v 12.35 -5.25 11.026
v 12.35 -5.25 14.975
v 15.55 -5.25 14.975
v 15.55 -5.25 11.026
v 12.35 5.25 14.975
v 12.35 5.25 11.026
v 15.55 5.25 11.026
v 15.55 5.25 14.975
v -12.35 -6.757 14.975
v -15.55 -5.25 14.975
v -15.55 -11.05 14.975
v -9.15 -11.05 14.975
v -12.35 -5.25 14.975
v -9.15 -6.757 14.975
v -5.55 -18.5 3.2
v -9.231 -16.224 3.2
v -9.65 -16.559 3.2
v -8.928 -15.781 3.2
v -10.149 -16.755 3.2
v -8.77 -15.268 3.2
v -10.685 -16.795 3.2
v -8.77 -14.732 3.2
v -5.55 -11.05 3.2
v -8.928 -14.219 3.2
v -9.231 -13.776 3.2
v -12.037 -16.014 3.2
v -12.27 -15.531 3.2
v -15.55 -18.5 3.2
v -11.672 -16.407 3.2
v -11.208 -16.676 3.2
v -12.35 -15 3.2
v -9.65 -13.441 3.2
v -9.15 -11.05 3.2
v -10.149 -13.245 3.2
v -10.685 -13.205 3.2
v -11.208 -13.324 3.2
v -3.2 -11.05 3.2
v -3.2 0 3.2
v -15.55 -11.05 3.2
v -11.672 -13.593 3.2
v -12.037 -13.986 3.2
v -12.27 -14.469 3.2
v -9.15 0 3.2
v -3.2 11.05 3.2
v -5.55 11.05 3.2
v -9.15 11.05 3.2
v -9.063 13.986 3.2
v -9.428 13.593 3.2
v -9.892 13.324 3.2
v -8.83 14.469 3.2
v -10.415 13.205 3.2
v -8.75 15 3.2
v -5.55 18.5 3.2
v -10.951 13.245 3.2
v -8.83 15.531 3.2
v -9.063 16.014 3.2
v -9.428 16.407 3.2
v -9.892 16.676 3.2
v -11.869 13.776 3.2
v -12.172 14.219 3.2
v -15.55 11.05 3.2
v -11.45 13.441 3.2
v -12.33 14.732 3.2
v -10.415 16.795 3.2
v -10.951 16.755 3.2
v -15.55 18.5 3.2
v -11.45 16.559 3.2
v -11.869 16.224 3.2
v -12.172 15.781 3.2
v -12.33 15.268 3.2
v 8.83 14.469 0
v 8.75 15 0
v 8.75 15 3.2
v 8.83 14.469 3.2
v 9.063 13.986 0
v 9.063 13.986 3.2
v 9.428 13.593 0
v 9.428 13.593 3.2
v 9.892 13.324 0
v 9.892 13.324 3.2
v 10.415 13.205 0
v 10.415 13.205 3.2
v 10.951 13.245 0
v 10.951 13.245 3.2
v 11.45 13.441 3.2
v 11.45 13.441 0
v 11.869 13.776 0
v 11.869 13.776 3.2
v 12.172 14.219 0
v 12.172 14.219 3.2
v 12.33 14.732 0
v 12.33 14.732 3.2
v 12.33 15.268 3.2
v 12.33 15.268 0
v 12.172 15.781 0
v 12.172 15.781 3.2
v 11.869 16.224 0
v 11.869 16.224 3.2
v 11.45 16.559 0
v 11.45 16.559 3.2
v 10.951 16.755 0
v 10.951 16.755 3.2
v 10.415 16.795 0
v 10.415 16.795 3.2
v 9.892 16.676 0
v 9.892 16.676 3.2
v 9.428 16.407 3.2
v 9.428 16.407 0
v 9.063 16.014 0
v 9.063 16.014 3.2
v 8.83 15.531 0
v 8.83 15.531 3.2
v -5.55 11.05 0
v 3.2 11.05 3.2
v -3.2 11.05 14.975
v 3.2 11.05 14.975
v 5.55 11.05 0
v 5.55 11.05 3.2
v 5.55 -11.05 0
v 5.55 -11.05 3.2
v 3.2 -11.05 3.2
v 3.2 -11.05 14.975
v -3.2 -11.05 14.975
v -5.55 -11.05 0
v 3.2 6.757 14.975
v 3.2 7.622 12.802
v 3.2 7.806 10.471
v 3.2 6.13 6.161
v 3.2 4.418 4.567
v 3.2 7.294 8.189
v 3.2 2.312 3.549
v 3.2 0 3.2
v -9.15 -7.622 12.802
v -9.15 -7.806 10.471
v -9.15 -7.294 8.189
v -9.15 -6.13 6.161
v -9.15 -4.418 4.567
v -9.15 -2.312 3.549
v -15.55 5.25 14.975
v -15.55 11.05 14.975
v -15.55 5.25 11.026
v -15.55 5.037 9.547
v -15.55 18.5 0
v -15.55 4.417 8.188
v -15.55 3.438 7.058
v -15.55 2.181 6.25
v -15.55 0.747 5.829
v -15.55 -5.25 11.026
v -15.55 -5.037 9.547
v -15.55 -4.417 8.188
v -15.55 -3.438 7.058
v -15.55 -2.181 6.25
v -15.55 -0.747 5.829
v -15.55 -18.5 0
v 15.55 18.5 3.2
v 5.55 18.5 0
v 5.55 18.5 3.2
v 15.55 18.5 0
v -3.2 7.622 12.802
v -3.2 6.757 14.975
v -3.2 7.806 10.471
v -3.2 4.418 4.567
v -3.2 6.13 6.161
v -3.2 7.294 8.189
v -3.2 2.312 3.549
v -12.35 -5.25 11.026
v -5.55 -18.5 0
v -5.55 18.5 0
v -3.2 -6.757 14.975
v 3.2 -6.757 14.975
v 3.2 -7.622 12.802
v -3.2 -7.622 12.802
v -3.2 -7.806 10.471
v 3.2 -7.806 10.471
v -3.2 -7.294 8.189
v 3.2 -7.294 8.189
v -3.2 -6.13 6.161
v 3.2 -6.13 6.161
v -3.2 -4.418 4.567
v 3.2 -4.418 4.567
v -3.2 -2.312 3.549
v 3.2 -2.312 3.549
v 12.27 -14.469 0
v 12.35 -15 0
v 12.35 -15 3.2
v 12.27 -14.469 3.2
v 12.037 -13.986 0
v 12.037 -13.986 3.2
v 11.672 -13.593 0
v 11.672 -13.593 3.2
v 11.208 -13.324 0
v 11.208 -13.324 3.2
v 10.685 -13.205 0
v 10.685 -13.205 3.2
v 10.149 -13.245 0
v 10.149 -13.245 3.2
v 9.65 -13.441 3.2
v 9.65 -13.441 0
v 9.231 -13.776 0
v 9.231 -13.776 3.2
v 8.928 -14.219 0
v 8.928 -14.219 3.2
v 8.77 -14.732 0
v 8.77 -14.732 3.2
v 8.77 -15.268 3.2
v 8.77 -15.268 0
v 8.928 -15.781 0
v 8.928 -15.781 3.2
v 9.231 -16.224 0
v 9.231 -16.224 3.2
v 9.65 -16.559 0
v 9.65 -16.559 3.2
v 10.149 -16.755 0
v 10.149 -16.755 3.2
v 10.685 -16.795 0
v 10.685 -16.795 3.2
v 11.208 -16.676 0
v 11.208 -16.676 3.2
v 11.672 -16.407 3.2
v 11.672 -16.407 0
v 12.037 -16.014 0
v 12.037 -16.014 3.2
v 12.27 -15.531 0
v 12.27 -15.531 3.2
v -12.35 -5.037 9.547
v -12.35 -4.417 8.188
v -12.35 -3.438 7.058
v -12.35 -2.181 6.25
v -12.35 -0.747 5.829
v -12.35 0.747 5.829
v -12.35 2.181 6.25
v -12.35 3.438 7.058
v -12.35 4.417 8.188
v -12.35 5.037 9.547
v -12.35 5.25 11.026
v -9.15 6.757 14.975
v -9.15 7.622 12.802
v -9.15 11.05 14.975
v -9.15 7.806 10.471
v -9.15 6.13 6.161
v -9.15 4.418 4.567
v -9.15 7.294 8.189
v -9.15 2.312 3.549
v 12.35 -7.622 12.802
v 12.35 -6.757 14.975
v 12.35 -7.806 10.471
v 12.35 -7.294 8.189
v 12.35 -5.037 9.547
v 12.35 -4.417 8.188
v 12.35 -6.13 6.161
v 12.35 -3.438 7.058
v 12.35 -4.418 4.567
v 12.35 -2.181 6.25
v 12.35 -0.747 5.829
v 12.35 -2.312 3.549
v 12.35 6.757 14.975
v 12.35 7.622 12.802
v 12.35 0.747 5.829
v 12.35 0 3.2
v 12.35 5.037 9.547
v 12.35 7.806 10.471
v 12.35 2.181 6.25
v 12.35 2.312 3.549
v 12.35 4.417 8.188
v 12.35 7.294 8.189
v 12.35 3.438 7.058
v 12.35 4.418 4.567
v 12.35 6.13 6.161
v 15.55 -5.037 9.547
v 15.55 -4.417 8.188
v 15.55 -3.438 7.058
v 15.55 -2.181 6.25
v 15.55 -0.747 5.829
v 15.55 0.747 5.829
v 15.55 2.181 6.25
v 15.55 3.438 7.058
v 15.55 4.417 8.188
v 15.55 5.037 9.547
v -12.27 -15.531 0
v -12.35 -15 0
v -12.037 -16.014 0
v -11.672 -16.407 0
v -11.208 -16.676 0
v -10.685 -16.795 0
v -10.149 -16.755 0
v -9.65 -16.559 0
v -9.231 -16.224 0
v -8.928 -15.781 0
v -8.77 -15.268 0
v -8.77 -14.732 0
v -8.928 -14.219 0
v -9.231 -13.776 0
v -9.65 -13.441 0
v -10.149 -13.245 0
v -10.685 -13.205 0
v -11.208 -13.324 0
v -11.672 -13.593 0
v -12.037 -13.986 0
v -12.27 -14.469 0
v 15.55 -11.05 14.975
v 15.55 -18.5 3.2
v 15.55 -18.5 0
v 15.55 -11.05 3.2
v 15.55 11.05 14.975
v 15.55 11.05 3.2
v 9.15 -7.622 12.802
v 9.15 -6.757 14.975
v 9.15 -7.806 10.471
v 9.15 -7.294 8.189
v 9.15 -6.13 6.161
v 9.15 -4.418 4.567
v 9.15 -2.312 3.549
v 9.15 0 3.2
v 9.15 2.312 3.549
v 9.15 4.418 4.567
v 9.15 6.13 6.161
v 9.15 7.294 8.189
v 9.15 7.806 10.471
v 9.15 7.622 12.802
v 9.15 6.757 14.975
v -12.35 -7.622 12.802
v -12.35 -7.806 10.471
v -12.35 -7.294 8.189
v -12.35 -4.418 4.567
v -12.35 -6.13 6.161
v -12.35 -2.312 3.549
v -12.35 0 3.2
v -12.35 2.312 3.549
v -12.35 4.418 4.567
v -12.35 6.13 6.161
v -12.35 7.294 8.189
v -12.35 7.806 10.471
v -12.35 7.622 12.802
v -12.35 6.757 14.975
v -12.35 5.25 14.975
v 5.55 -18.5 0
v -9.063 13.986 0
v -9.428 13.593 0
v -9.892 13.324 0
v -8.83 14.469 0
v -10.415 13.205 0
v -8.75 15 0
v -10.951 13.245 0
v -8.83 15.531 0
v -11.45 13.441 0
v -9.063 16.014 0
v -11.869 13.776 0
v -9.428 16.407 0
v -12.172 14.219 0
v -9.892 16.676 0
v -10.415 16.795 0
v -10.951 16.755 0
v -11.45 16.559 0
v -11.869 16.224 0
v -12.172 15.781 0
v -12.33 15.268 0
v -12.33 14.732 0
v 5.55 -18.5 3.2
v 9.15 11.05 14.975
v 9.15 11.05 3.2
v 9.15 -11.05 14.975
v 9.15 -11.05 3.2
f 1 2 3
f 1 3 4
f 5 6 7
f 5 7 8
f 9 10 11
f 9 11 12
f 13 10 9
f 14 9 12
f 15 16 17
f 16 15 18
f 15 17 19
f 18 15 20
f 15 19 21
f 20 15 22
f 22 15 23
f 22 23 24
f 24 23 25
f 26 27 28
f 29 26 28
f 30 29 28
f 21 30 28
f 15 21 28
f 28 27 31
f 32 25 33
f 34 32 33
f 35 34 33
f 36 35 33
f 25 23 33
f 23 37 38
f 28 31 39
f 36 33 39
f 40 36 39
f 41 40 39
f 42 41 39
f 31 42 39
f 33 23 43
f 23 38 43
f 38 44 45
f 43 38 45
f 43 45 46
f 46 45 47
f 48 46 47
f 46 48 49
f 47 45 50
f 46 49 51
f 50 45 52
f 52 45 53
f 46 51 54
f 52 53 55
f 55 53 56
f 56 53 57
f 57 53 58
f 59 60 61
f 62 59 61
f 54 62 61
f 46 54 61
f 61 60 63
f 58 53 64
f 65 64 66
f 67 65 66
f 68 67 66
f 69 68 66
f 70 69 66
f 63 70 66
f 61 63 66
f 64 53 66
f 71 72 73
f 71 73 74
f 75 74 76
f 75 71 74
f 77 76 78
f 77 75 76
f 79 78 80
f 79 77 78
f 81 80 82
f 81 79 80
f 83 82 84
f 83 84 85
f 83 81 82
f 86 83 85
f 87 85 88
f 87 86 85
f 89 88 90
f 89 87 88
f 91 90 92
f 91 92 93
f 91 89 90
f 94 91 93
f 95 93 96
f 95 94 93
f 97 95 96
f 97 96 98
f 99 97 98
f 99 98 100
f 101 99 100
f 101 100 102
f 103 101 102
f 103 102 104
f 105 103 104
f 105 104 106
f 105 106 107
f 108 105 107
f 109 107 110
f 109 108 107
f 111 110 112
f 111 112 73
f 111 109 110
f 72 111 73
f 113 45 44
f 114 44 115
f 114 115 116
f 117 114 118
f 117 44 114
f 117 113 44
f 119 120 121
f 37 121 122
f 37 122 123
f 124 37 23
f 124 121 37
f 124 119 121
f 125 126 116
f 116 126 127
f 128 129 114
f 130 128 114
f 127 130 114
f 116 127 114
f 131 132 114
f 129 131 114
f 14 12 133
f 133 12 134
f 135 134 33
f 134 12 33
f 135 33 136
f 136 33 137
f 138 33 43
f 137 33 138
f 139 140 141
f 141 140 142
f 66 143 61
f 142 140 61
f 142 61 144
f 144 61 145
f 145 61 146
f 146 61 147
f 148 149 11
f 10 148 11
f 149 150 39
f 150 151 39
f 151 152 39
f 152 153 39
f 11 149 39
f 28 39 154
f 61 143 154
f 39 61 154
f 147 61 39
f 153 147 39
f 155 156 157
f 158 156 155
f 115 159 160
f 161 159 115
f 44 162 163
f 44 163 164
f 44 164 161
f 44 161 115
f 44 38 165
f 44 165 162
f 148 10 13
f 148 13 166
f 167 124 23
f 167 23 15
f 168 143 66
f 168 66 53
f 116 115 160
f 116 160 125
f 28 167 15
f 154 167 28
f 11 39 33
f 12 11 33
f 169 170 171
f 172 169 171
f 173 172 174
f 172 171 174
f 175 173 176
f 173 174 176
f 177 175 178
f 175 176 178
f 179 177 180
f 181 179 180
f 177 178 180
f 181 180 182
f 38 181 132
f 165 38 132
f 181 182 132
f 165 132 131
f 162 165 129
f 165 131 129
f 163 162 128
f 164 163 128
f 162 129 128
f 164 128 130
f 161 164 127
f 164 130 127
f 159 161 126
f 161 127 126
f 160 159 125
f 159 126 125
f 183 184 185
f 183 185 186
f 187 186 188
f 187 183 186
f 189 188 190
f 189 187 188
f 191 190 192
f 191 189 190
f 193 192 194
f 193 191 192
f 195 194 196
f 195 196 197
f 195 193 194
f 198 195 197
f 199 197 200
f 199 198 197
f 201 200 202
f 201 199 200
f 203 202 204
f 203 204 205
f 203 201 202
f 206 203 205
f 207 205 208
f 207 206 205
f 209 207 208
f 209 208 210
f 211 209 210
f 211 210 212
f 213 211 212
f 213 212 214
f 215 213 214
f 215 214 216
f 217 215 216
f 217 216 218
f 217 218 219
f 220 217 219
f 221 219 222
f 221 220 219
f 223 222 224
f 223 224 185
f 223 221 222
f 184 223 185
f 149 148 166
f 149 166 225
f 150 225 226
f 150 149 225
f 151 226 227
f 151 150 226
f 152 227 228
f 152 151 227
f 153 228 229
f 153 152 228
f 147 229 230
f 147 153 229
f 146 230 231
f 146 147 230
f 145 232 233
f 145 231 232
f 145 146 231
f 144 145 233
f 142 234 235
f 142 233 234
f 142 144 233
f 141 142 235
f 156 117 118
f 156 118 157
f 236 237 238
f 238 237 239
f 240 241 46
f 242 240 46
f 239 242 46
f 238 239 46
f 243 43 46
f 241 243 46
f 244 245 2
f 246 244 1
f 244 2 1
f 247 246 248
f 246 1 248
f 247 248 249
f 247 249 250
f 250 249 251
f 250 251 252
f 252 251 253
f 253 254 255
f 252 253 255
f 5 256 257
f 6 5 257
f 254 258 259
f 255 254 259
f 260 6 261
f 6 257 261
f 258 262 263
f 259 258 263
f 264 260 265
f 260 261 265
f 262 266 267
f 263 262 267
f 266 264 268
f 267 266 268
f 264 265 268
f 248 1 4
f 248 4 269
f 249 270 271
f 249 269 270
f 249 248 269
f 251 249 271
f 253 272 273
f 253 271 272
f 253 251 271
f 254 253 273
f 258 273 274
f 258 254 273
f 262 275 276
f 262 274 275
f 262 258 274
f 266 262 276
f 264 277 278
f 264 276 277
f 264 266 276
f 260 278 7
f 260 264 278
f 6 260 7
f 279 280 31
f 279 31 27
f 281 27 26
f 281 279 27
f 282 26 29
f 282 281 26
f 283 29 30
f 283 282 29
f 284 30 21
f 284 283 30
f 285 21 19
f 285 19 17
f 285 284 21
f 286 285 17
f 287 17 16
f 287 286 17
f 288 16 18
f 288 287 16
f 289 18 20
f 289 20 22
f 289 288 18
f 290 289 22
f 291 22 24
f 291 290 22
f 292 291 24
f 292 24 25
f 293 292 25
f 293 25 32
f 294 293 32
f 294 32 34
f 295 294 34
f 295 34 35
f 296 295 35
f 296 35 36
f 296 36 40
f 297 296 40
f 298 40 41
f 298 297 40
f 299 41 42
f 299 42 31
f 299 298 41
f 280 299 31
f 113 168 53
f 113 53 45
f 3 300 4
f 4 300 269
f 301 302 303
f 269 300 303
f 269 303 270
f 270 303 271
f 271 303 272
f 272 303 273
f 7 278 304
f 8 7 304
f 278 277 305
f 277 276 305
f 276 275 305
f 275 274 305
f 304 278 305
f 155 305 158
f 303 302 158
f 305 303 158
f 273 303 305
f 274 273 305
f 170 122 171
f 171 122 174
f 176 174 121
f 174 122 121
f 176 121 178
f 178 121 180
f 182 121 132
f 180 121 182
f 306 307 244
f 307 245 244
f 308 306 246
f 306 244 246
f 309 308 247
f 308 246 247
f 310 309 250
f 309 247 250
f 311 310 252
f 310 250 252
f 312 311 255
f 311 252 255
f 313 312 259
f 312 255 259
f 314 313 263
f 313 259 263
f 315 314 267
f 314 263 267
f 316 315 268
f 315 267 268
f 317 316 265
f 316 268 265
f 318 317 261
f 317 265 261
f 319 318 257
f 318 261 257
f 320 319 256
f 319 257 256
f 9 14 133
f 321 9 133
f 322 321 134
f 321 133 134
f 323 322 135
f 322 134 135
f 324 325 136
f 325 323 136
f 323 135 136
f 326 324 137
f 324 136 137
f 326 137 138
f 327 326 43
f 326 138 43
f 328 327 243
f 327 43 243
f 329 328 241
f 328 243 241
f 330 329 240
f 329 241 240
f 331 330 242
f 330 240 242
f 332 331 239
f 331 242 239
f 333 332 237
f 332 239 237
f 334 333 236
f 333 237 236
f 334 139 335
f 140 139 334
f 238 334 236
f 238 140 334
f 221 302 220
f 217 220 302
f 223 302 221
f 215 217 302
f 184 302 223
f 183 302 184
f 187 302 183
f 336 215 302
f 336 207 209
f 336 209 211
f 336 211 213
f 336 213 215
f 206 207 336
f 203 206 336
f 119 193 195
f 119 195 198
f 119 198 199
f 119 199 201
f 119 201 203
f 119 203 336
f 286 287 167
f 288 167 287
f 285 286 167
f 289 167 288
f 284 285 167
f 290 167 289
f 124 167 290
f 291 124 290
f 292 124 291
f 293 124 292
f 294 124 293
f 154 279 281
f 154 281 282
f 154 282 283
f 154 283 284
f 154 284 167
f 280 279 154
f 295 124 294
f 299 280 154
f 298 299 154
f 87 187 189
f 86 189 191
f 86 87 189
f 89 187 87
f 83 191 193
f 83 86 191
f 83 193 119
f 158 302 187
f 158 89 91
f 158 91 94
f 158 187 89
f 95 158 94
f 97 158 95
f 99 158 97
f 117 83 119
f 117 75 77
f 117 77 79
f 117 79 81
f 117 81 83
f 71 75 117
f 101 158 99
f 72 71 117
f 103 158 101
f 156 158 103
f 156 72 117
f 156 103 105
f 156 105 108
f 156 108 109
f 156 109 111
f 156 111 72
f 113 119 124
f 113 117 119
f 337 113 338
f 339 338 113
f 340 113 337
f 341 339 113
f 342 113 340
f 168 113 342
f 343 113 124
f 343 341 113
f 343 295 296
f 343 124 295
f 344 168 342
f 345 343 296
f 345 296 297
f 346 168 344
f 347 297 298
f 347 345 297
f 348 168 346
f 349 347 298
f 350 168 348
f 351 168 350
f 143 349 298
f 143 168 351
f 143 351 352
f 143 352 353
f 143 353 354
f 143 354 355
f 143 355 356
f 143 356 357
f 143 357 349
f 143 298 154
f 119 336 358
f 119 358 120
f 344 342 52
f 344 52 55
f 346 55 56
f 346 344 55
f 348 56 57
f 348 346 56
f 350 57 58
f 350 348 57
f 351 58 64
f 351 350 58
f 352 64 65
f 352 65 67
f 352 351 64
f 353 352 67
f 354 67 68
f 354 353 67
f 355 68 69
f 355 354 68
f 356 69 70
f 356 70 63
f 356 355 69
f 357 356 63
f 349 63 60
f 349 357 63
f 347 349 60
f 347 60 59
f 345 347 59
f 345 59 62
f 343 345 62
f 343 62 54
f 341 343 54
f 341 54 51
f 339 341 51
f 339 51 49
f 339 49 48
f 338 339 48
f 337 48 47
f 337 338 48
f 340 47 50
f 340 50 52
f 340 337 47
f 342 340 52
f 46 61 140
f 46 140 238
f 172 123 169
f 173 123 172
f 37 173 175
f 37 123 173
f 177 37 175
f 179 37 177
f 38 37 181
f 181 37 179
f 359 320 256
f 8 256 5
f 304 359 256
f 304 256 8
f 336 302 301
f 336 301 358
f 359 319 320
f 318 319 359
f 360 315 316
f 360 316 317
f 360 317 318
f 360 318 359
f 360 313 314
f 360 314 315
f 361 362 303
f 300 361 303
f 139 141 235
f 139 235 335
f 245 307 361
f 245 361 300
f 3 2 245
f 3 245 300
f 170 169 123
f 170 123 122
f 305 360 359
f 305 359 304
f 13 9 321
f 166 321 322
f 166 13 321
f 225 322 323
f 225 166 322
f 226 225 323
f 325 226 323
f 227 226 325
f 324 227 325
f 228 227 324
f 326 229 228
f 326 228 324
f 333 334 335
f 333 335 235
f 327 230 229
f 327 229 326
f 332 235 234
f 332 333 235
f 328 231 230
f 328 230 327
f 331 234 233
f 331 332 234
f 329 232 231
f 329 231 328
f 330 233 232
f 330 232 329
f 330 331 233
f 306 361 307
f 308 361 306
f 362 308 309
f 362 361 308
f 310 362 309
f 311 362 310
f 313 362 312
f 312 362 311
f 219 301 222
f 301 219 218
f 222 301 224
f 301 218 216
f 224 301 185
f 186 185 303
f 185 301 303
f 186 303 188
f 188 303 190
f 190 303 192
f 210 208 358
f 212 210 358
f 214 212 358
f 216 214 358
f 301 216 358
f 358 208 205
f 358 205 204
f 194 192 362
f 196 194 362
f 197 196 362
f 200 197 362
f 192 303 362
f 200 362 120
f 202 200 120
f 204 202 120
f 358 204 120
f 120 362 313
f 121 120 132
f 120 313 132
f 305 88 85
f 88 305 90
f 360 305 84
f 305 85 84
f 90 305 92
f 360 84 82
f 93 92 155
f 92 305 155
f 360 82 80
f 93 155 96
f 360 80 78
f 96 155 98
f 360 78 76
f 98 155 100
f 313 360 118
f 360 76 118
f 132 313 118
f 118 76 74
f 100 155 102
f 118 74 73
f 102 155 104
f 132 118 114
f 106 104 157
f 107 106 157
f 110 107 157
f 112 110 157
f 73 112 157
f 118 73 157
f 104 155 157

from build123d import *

# Parameters (mm, degrees)
SCHIZZO1_R         = 1.8
BASE_DEPTH         = 3.2
SCHIZZO2_W         = 6.4
SCHIZZO2_H         = 22.1
STAND_OFF_DEPTH    = 11.775
SCHIZZO3_R         = 7.826
BEARING_SLOT_DEPTH = 12.35
SHAFT_HOLES_REACH  = 41.163


with BuildPart() as part:
    # Schizzo1 → Base (new body)
    with BuildSketch(Plane.XY):
        Polygon((-15.55, 11.05), (-15.55, 18.5), (-5.55, 18.5), (-5.55, 11.05), (5.55, 11.05), (5.55, 18.5), (15.55, 18.5), (15.55, 11.05), (15.55, -11.05), (15.55, -18.5), (5.55, -18.5), (5.55, -11.05), (-5.55, -11.05), (-5.55, -18.5), (-15.55, -18.5), (-15.55, -11.05), align=None)
        with Locations((-10.55, 15)):
            Circle(SCHIZZO1_R, mode=Mode.SUBTRACT)
        with Locations(Location((10.55, 15, 0), (0, 0, 180))):
            Circle(SCHIZZO1_R, mode=Mode.SUBTRACT)
        with Locations((10.55, -15)):
            Circle(SCHIZZO1_R, mode=Mode.SUBTRACT)
        with Locations(Location((-10.55, -15, 0), (0, 0, 180))):
            Circle(SCHIZZO1_R, mode=Mode.SUBTRACT)
    extrude(amount=BASE_DEPTH)

    # Schizzo2 → Stand-off (add)
    with BuildSketch(Plane.XY.offset(3.2)):
        with Locations((-12.35, 0)):
            Rectangle(SCHIZZO2_W, SCHIZZO2_H)
        Rectangle(SCHIZZO2_W, SCHIZZO2_H)
        with Locations((12.35, 0)):
            Rectangle(SCHIZZO2_W, SCHIZZO2_H)
    extrude(amount=STAND_OFF_DEPTH)

    # Schizzo3 → Bearing slot (cut, symmetric)
    with BuildSketch(Plane(origin=(0, 0, 0), x_dir=(0, 0, -1), z_dir=(1, 0, 0))):
        with Locations((-11.026, 0)):
            Circle(SCHIZZO3_R)
    extrude(amount=BEARING_SLOT_DEPTH, both=True, mode=Mode.SUBTRACT)

    # Shaft holes: up to this face of the body (flat: up to its plane)
    shaft_holes_end = Plane(part.part.faces().sort_by_distance((15.55, 0, 6.746095849))[0])
    # Schizzo4 → Shaft holes (cut, up to the picked face)
    with BuildSketch(Plane.ZY.offset(15.55), mode=Mode.PRIVATE) as shaft_holes_sk1:
        with BuildLine():
            Line((11.026, 5.25), (14.975, 5.25))
            Line((14.975, 5.25), (14.975, -5.25))
            Line((14.975, -5.25), (11.026, -5.25))
            ThreePointArc((11.026, -5.25), (5.776, 0), (11.026, 5.25))
        make_face()
    shaft_holes_tool1 = split(extrude(shaft_holes_sk1.sketch, amount=-SHAFT_HOLES_REACH, mode=Mode.PRIVATE), bisect_by=shaft_holes_end, keep=Keep.BOTH, mode=Mode.PRIVATE)
    add(shaft_holes_tool1.solids().sort_by(Axis((-15.55, 0, 10.853782), (1, 0, 0)))[0], mode=Mode.SUBTRACT)


solid = part.part
